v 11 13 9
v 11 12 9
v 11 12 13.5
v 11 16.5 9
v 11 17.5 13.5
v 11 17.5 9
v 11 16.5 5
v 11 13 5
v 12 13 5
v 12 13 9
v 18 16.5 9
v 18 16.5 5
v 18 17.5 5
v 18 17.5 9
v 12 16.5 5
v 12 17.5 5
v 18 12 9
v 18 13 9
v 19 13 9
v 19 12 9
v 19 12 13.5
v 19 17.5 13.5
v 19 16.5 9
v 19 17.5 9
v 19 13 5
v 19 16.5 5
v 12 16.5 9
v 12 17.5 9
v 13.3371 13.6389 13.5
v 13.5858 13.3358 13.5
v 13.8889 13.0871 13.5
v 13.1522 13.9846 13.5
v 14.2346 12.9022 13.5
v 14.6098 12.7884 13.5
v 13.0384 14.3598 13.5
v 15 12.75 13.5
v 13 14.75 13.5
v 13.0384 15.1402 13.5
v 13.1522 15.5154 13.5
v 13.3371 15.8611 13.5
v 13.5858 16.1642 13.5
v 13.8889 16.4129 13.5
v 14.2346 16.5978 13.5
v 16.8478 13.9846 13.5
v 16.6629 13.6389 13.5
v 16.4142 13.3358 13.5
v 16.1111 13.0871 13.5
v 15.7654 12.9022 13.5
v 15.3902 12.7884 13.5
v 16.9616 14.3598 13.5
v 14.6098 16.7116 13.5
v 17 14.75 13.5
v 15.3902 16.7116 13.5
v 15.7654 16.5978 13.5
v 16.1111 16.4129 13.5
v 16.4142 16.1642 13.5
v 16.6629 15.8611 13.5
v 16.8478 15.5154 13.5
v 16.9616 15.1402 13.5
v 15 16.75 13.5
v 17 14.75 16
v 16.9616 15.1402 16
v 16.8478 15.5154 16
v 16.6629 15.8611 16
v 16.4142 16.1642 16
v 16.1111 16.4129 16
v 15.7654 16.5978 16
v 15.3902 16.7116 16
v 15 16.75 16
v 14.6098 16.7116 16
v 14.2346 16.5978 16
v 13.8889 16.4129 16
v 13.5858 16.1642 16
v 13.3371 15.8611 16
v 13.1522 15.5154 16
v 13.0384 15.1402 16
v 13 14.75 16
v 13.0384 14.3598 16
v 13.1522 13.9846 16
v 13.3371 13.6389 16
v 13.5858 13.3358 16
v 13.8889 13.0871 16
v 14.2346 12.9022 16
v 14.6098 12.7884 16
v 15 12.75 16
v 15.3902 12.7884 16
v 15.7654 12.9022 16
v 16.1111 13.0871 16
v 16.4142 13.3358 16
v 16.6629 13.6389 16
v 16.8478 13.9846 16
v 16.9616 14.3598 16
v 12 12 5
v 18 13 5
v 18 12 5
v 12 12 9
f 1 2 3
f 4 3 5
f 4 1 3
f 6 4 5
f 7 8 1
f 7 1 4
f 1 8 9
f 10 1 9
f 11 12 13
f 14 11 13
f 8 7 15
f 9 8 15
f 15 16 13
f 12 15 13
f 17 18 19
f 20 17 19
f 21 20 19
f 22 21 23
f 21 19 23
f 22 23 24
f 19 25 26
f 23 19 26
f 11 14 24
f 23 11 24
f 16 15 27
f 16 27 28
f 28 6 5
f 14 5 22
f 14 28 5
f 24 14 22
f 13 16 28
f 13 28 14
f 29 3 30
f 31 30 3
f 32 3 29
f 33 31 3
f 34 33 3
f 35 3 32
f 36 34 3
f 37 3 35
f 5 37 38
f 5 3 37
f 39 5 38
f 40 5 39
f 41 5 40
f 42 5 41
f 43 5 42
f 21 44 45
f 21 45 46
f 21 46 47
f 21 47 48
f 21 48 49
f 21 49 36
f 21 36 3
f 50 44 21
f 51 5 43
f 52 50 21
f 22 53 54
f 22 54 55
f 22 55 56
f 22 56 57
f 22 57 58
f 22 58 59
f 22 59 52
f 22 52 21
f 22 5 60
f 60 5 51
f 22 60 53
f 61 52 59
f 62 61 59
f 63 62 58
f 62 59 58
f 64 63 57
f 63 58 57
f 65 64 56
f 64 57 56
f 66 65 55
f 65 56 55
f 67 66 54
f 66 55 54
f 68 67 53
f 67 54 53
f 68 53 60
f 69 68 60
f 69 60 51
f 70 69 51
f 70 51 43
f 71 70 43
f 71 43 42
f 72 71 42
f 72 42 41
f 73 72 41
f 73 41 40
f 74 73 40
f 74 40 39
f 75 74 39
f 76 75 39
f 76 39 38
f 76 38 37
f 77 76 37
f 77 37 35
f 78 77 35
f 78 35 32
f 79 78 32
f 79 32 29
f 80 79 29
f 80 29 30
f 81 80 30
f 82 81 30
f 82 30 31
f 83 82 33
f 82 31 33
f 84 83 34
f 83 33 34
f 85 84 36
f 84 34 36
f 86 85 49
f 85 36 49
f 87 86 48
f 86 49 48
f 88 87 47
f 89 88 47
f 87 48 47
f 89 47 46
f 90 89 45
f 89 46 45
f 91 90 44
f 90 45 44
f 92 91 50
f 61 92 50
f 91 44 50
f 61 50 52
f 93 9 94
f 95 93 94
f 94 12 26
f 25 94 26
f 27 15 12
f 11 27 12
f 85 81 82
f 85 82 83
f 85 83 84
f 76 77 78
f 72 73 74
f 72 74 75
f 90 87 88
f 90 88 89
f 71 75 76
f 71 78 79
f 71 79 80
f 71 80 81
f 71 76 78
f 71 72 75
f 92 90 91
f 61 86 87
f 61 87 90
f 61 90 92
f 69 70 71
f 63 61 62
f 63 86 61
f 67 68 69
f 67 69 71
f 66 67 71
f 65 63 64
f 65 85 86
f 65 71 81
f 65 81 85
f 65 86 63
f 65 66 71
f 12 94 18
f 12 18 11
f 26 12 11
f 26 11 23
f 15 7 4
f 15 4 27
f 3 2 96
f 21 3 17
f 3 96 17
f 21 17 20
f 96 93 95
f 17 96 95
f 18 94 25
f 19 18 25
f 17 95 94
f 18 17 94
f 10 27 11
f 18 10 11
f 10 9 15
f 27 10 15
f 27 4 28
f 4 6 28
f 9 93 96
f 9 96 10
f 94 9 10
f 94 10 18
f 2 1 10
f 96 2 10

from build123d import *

# Parameters (mm, degrees)
BOX004_W       = 1
BOX004_H       = 3.5
BOX004_DEPTH   = 4
BOX005_W       = 1
BOX005_H       = 3.5
BOX005_DEPTH   = 4
CYLINDER_R     = 2
CYLINDER_DEPTH = 3
BOX006_W       = 6
BOX006_H       = 1
BOX006_DEPTH   = 4
BOX007_W       = 6
BOX007_H       = 1
BOX007_DEPTH   = 4
BOX003_W       = 8
BOX003_H       = 5.5
BOX003_DEPTH   = 4.5


with BuildPart() as cube001:
    # Box004 → Box004 (new body)
    with BuildSketch(Plane(origin=(11, 13, 5), x_dir=(1, 0, 0), z_dir=(0, 0, 1))):
        with Locations((0.5, 1.75)):
            Rectangle(BOX004_W, BOX004_H)
    extrude(amount=BOX004_DEPTH)


with BuildPart() as cube002:
    # Box005 → Box005 (new body)
    with BuildSketch(Plane(origin=(18, 13, 5), x_dir=(1, 0, 0), z_dir=(0, 0, 1))):
        with Locations((0.5, 1.75)):
            Rectangle(BOX005_W, BOX005_H)
    extrude(amount=BOX005_DEPTH)


with BuildPart() as cylinder:
    # Cylinder → Cylinder (new body)
    with BuildSketch(Plane(origin=(15, 14.75, 13), x_dir=(1, 0, 0), z_dir=(0, 0, 1))):
        Circle(CYLINDER_R)
    extrude(amount=CYLINDER_DEPTH)


with BuildPart() as cube003:
    # Box006 → Box006 (new body)
    with BuildSketch(Plane(origin=(12, 12, 5), x_dir=(1, 0, 0), z_dir=(0, 0, 1))):
        with Locations((3, 0.5)):
            Rectangle(BOX006_W, BOX006_H)
    extrude(amount=BOX006_DEPTH)


with BuildPart() as cube004:
    # Box007 → Box007 (new body)
    with BuildSketch(Plane(origin=(12, 16.5, 5), x_dir=(1, 0, 0), z_dir=(0, 0, 1))):
        with Locations((3, 0.5)):
            Rectangle(BOX007_W, BOX007_H)
    extrude(amount=BOX007_DEPTH)


with BuildPart() as bt_ex001:
    # Box003 → Box003 (new body)
    with BuildSketch(Plane(origin=(11, 12, 9), x_dir=(1, 0, 0), z_dir=(0, 0, 1))):
        with Locations((4, 2.75)):
            Rectangle(BOX003_W, BOX003_H)
    extrude(amount=BOX003_DEPTH)

    # Fusion: union Cube001, Cube002, Cylinder, Cube003, Cube004
    add(cube001.part)
    add(cube002.part)
    add(cylinder.part)
    add(cube003.part)
    add(cube004.part)


solid = bt_ex001.part
